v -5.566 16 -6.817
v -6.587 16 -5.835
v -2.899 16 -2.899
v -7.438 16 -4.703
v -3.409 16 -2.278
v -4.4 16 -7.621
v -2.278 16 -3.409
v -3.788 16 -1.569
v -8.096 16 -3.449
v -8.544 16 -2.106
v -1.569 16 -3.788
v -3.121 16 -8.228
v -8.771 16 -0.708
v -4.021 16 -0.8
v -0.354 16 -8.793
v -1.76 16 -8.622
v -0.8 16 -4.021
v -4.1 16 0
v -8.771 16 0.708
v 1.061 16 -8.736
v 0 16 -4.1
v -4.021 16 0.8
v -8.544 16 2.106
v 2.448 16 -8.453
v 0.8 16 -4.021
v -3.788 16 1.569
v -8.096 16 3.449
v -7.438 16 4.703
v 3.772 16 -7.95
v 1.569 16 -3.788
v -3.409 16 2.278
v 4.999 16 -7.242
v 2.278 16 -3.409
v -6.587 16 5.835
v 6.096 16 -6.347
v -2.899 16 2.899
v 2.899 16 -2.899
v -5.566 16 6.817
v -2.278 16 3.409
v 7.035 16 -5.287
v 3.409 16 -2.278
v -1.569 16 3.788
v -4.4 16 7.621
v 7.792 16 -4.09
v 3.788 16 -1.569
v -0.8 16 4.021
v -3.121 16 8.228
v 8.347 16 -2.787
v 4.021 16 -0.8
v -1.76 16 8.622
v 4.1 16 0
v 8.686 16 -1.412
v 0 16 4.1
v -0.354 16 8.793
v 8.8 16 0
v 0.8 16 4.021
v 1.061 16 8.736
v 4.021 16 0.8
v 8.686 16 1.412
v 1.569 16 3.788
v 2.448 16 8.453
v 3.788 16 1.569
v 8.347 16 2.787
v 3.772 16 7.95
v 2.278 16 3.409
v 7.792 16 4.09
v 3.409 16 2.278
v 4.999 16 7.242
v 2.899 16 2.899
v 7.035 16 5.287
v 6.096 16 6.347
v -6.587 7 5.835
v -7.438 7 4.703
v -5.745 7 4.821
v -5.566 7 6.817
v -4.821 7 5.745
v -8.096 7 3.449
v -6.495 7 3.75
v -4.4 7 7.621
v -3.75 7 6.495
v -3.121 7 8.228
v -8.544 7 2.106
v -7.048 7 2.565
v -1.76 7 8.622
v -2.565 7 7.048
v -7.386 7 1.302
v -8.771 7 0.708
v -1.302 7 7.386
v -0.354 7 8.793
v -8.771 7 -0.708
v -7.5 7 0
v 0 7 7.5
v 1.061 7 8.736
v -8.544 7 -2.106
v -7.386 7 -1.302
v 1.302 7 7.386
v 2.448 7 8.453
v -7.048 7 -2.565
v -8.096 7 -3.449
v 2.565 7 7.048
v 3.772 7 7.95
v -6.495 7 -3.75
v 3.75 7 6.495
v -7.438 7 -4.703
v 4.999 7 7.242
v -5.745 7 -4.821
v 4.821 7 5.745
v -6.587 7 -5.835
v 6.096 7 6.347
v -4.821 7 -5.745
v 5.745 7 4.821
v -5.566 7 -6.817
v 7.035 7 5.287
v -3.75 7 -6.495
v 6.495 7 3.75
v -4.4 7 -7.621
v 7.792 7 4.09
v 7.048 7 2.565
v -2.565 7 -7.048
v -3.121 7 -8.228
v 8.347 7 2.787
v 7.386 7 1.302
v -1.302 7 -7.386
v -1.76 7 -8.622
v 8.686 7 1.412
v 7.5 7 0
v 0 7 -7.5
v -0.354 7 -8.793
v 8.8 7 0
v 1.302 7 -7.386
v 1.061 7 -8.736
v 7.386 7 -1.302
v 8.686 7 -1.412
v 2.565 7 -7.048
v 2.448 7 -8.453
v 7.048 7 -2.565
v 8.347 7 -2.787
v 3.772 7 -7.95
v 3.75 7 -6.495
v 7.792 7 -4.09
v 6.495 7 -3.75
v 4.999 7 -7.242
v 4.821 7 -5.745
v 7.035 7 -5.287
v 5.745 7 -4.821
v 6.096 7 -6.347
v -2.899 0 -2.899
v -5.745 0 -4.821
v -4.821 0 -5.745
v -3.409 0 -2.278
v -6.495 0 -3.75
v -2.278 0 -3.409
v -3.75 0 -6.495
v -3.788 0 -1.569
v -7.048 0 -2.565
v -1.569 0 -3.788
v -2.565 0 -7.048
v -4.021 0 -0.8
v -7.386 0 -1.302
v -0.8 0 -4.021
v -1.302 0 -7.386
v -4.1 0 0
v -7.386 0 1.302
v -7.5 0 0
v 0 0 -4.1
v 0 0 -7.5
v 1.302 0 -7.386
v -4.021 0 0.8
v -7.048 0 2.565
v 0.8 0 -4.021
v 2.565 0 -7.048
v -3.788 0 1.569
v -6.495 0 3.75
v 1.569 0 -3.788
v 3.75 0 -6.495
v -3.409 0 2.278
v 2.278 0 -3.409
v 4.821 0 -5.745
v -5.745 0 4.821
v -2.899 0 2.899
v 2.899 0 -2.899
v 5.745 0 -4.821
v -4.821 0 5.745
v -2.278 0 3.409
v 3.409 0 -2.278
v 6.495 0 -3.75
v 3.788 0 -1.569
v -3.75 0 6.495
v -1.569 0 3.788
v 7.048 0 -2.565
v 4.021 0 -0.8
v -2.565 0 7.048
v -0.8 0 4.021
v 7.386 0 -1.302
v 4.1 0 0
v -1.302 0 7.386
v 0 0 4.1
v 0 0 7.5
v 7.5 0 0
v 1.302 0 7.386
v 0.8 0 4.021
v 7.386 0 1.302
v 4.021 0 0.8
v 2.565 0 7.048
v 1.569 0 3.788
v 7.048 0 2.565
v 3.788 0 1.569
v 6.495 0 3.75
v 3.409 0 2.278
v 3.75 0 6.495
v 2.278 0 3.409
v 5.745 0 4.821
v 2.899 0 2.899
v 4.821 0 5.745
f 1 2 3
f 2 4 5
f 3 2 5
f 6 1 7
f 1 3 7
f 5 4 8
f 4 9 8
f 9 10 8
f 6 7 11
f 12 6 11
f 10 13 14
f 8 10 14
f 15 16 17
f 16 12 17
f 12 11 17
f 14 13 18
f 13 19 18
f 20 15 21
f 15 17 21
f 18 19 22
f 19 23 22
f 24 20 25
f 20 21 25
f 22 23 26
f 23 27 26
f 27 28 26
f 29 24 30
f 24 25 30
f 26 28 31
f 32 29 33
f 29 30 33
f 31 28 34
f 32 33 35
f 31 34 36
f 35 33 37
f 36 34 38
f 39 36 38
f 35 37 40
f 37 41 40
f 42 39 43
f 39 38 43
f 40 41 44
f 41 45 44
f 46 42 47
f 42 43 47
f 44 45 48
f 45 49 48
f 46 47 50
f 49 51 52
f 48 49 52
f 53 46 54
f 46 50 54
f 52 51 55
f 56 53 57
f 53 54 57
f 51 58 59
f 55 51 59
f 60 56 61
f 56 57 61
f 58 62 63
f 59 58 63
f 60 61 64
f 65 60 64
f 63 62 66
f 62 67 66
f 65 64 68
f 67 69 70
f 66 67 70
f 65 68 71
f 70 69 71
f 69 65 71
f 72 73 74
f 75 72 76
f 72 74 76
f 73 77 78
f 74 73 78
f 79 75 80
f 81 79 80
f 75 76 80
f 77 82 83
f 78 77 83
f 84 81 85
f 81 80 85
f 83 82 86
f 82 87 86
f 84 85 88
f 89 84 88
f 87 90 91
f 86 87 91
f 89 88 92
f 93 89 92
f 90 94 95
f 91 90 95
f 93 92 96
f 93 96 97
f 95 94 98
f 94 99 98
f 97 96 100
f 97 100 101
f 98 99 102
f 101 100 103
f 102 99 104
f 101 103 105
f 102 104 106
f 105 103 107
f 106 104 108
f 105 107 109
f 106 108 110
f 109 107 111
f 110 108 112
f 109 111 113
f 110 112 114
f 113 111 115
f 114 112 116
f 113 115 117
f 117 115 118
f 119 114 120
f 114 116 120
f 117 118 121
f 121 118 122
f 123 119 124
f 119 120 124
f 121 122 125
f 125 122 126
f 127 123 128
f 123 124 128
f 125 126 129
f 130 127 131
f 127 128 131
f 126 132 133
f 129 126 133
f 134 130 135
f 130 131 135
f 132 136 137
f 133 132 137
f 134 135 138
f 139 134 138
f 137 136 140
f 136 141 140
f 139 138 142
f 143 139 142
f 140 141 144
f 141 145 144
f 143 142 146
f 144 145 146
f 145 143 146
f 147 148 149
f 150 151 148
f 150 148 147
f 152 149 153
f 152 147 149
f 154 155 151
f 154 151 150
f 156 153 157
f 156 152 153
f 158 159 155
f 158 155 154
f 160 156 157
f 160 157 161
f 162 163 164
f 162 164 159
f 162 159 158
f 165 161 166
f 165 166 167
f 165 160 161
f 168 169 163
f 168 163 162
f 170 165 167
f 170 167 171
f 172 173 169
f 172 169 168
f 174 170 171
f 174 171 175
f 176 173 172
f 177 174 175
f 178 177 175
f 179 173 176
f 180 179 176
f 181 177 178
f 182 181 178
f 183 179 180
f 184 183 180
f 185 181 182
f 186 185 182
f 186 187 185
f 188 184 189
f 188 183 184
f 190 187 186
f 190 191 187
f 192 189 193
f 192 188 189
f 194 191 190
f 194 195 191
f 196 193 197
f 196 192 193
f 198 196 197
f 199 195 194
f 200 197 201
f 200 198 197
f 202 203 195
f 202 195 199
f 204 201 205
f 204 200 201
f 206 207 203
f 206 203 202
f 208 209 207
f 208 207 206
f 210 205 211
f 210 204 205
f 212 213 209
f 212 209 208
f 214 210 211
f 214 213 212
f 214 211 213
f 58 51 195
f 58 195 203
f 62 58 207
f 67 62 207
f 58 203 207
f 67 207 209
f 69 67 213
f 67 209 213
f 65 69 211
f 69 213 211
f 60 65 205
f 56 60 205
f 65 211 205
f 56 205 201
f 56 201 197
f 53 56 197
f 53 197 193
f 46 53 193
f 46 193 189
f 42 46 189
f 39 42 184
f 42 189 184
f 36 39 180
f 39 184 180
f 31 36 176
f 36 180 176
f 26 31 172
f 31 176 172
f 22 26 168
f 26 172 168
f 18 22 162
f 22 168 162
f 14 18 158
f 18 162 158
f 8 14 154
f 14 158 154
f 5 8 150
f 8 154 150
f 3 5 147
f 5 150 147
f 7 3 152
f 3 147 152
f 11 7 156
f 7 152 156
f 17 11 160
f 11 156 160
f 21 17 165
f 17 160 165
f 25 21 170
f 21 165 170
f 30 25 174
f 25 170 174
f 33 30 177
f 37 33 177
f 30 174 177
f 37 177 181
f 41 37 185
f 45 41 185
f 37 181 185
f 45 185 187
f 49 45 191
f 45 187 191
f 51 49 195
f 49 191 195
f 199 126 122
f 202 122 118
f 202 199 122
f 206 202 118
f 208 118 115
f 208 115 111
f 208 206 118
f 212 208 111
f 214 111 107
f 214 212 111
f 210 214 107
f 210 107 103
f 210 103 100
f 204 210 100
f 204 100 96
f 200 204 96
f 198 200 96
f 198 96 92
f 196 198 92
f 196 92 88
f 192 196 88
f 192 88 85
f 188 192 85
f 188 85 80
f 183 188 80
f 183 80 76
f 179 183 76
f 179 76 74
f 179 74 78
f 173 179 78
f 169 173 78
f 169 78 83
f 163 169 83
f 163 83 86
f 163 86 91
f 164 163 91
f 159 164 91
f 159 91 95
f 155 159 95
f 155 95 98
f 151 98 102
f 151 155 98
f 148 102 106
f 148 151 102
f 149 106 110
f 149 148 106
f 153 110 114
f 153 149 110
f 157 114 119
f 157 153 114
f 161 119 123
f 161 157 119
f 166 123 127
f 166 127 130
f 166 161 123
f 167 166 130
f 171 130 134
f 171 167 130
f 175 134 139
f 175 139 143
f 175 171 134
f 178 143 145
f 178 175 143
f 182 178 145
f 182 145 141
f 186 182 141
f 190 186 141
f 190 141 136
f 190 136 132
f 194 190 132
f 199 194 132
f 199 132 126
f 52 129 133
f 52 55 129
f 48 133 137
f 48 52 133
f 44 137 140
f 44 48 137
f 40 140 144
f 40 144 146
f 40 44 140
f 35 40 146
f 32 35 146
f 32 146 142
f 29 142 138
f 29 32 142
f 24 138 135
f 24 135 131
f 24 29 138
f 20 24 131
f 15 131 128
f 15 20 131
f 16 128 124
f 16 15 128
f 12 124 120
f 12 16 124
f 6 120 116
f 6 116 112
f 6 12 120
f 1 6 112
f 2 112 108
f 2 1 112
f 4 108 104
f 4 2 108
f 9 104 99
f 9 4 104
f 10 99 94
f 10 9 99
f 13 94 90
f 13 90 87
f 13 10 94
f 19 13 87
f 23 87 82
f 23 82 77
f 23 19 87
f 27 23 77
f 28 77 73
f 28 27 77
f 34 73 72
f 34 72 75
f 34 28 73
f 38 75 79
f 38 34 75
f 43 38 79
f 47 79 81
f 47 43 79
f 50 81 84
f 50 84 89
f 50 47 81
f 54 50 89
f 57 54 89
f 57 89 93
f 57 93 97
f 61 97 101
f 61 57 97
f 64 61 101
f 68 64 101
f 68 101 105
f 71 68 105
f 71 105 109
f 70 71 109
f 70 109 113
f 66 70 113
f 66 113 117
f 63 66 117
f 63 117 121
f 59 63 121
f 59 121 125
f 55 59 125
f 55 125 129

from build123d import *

# Parameters (mm, degrees)
SKETCH1_R           = 7.3
SKETCH1_R_2         = 2.4
BOSS_EXTRUDE1_DEPTH = 10
SKETCH2_R           = 8.8
SKETCH2_R_2         = 7.3
BOSS_EXTRUDE2_DEPTH = 3
SKETCH3_R           = 8.8
SKETCH3_R_2         = 2.4
BOSS_EXTRUDE3_DEPTH = 6
SKETCH4_R           = 4.2
SKETCH4_R_2         = 2.4
CUT_EXTRUDE1_DEPTH  = 43
BOSS_EXTRUDE4_REACH = 18
SKETCH5_R           = 7.5
SKETCH5_R_2         = 7.3
SKETCH6_R           = 4.2
SKETCH6_R_2         = 4.1
BOSS_EXTRUDE5_DEPTH = 16


with BuildPart() as part:
    # Sketch1 → Boss-Extrude1 (new body)
    with BuildSketch(Plane(origin=(0, 0, 0), x_dir=(1, 0, 0), z_dir=(0, 1, 0))):
        Circle(SKETCH1_R)
        Circle(SKETCH1_R_2, mode=Mode.SUBTRACT)
    extrude(amount=BOSS_EXTRUDE1_DEPTH)

    # Sketch2 → Boss-Extrude2 (add)
    with BuildSketch(Plane(origin=(0, 10, 0), x_dir=(1, 0, 0), z_dir=(0, 1, 0))):
        Circle(SKETCH2_R)
        Circle(SKETCH2_R_2, mode=Mode.SUBTRACT)
    extrude(amount=-BOSS_EXTRUDE2_DEPTH)

    # Sketch3 → Boss-Extrude3 (add)
    with BuildSketch(Plane(origin=(0, 10, 0), x_dir=(1, 0, 0), z_dir=(0, 1, 0))):
        Circle(SKETCH3_R)
        Circle(SKETCH3_R_2, mode=Mode.SUBTRACT)
    extrude(amount=BOSS_EXTRUDE3_DEPTH)

    # Sketch4 → Cut-Extrude1 (cut)
    with BuildSketch(Plane(origin=(0, 16, 0), x_dir=(1, 0, 0), z_dir=(0, 1, 0))):
        Circle(SKETCH4_R)
        Circle(SKETCH4_R_2, mode=Mode.SUBTRACT)
    extrude(amount=-CUT_EXTRUDE1_DEPTH, mode=Mode.SUBTRACT)

    # Sketch5 → Boss-Extrude4 (add, up to next)
    with BuildSketch(Plane.XZ, mode=Mode.PRIVATE) as boss_extrude4_sk1:
        Circle(SKETCH5_R)
        Circle(SKETCH5_R_2, mode=Mode.SUBTRACT)
    boss_extrude4_tool1 = extrude(boss_extrude4_sk1.sketch, amount=-BOSS_EXTRUDE4_REACH, mode=Mode.PRIVATE) - part.part
    add(boss_extrude4_tool1.solids().sort_by_distance((-7.478787, 0, 0))[0])

    # Sketch6 → Boss-Extrude5 (add)
    with BuildSketch(Plane.XZ):
        Circle(SKETCH6_R)
        Circle(SKETCH6_R_2, mode=Mode.SUBTRACT)
    extrude(amount=-BOSS_EXTRUDE5_DEPTH)


solid = part.part
